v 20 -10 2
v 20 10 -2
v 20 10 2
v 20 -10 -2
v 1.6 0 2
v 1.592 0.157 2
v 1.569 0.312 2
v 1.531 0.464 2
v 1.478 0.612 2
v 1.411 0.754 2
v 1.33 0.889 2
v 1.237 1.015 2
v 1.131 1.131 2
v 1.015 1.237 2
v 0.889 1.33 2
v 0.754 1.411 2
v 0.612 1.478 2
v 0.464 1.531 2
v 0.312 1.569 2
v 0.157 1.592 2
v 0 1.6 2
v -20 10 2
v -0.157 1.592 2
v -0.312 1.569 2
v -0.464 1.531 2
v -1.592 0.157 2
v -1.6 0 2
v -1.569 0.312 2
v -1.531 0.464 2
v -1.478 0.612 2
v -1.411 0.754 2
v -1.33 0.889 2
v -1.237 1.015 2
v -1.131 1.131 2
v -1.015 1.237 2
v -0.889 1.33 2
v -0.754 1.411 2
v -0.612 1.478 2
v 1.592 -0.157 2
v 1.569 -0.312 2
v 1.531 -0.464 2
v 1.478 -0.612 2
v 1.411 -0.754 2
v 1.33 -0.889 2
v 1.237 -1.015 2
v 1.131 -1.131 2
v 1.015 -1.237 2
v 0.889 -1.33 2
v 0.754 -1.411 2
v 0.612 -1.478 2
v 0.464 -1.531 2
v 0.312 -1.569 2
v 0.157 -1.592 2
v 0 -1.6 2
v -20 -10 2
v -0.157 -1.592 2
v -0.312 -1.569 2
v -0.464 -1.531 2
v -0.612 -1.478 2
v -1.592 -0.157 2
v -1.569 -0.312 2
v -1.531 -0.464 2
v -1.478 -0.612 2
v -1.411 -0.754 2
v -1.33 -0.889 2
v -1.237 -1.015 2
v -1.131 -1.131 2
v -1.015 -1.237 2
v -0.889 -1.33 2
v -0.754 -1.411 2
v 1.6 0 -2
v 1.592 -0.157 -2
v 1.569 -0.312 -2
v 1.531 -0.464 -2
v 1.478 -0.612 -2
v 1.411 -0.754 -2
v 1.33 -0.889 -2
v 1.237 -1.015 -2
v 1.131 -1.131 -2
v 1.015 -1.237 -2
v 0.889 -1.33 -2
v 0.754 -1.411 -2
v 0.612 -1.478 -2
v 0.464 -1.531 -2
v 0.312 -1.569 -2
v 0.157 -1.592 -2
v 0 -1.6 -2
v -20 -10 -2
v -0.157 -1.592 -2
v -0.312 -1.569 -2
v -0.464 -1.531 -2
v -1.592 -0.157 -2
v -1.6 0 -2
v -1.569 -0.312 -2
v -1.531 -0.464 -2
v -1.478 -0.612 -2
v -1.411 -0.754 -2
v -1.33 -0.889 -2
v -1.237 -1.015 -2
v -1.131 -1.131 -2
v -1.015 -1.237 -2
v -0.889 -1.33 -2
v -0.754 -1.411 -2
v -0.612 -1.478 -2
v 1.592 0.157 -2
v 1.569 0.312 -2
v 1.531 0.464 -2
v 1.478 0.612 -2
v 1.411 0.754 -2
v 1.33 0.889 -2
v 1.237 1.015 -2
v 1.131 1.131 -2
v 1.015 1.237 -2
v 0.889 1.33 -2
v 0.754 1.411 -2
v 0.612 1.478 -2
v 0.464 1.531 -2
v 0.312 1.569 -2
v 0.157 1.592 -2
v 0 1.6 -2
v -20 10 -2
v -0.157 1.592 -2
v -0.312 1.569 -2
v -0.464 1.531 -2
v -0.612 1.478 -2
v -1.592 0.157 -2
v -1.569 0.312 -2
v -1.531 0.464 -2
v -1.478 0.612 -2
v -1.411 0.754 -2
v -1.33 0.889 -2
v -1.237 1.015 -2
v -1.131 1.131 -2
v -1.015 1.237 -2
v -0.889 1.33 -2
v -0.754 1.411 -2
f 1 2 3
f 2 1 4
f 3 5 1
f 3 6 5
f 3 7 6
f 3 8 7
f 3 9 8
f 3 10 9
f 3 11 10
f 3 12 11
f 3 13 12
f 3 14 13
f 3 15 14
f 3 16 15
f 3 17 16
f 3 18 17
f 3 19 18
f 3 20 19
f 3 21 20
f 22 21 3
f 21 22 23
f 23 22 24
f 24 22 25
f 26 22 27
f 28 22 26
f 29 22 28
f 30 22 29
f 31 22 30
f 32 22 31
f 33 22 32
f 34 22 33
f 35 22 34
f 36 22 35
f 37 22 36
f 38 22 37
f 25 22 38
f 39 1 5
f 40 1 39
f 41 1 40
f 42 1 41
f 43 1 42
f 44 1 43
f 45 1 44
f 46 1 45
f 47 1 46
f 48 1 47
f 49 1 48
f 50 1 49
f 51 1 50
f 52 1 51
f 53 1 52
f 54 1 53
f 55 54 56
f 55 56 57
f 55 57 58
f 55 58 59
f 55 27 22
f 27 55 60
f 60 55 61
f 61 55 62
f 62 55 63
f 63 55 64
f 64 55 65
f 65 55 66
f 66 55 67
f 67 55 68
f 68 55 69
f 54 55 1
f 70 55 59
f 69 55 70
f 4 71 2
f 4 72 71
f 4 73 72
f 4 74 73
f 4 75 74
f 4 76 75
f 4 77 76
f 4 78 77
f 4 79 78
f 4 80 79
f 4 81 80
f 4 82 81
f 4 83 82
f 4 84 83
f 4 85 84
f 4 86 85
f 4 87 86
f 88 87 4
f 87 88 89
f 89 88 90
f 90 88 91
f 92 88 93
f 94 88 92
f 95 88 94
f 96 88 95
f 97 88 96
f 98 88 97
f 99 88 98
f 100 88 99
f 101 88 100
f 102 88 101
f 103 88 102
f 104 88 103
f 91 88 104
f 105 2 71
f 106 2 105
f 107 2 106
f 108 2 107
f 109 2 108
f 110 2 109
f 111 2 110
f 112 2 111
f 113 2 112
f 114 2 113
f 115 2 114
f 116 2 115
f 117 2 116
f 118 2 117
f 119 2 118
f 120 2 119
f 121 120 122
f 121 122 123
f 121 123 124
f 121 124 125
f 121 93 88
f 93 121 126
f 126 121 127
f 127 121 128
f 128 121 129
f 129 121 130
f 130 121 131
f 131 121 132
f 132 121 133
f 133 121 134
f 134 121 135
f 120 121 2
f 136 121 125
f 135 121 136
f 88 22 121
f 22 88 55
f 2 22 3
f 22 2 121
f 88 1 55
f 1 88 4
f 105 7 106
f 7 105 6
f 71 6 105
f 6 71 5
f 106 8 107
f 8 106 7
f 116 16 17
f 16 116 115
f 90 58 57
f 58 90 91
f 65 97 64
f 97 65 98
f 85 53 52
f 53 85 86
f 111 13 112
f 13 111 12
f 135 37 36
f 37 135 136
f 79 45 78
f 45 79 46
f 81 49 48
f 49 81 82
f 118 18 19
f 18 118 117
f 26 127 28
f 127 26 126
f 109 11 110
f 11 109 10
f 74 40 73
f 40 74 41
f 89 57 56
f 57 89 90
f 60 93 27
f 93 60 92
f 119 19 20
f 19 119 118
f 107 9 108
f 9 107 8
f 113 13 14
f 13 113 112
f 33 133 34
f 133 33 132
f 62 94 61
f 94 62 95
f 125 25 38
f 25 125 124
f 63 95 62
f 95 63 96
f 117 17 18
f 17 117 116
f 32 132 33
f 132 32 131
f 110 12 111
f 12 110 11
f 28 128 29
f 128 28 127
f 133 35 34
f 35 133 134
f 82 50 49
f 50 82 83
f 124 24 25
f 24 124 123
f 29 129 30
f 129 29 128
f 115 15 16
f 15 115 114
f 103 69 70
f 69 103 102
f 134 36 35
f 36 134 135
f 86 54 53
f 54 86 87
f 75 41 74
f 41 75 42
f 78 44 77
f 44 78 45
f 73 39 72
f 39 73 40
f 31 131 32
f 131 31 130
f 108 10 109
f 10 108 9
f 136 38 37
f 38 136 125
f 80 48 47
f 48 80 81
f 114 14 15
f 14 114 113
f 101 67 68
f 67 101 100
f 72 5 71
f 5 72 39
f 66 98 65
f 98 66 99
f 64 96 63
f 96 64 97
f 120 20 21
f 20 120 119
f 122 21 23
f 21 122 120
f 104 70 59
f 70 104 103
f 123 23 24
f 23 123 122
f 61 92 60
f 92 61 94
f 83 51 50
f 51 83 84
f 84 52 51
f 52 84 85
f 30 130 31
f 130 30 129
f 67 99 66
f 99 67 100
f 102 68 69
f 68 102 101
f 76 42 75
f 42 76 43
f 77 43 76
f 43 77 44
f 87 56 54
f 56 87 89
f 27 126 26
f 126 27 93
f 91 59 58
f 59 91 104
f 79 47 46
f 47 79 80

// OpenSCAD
// template.scad
// Starter model wrapper.
//
// How to use:
// - Copy this file to a new name (e.g., bracket.scad).
// - Edit the parameters and the main() module.
// - Keep reusable helpers in a local lib/ folder if needed.

// ---------- Public parameters (mm) ----------
debug = false;

part_w = 40;
part_h = 20;
part_t = 4;

hole_d = 3.2; // e.g., clearance for M3.
$fn = 64; // Surface quality.

// ---------- Model ----------
module main() {
  difference() {
    // Base plate.
    cube([part_w, part_h, part_t], center = true);

    // Through hole at center.
    cylinder(d = hole_d, h = part_t + 2, center = true);
  }

  if (debug) {
    // Highlight the nominal hole cylinder (visual check).
    #cylinder(d = hole_d, h = part_t + 2, center = true);
  }
}

main();
